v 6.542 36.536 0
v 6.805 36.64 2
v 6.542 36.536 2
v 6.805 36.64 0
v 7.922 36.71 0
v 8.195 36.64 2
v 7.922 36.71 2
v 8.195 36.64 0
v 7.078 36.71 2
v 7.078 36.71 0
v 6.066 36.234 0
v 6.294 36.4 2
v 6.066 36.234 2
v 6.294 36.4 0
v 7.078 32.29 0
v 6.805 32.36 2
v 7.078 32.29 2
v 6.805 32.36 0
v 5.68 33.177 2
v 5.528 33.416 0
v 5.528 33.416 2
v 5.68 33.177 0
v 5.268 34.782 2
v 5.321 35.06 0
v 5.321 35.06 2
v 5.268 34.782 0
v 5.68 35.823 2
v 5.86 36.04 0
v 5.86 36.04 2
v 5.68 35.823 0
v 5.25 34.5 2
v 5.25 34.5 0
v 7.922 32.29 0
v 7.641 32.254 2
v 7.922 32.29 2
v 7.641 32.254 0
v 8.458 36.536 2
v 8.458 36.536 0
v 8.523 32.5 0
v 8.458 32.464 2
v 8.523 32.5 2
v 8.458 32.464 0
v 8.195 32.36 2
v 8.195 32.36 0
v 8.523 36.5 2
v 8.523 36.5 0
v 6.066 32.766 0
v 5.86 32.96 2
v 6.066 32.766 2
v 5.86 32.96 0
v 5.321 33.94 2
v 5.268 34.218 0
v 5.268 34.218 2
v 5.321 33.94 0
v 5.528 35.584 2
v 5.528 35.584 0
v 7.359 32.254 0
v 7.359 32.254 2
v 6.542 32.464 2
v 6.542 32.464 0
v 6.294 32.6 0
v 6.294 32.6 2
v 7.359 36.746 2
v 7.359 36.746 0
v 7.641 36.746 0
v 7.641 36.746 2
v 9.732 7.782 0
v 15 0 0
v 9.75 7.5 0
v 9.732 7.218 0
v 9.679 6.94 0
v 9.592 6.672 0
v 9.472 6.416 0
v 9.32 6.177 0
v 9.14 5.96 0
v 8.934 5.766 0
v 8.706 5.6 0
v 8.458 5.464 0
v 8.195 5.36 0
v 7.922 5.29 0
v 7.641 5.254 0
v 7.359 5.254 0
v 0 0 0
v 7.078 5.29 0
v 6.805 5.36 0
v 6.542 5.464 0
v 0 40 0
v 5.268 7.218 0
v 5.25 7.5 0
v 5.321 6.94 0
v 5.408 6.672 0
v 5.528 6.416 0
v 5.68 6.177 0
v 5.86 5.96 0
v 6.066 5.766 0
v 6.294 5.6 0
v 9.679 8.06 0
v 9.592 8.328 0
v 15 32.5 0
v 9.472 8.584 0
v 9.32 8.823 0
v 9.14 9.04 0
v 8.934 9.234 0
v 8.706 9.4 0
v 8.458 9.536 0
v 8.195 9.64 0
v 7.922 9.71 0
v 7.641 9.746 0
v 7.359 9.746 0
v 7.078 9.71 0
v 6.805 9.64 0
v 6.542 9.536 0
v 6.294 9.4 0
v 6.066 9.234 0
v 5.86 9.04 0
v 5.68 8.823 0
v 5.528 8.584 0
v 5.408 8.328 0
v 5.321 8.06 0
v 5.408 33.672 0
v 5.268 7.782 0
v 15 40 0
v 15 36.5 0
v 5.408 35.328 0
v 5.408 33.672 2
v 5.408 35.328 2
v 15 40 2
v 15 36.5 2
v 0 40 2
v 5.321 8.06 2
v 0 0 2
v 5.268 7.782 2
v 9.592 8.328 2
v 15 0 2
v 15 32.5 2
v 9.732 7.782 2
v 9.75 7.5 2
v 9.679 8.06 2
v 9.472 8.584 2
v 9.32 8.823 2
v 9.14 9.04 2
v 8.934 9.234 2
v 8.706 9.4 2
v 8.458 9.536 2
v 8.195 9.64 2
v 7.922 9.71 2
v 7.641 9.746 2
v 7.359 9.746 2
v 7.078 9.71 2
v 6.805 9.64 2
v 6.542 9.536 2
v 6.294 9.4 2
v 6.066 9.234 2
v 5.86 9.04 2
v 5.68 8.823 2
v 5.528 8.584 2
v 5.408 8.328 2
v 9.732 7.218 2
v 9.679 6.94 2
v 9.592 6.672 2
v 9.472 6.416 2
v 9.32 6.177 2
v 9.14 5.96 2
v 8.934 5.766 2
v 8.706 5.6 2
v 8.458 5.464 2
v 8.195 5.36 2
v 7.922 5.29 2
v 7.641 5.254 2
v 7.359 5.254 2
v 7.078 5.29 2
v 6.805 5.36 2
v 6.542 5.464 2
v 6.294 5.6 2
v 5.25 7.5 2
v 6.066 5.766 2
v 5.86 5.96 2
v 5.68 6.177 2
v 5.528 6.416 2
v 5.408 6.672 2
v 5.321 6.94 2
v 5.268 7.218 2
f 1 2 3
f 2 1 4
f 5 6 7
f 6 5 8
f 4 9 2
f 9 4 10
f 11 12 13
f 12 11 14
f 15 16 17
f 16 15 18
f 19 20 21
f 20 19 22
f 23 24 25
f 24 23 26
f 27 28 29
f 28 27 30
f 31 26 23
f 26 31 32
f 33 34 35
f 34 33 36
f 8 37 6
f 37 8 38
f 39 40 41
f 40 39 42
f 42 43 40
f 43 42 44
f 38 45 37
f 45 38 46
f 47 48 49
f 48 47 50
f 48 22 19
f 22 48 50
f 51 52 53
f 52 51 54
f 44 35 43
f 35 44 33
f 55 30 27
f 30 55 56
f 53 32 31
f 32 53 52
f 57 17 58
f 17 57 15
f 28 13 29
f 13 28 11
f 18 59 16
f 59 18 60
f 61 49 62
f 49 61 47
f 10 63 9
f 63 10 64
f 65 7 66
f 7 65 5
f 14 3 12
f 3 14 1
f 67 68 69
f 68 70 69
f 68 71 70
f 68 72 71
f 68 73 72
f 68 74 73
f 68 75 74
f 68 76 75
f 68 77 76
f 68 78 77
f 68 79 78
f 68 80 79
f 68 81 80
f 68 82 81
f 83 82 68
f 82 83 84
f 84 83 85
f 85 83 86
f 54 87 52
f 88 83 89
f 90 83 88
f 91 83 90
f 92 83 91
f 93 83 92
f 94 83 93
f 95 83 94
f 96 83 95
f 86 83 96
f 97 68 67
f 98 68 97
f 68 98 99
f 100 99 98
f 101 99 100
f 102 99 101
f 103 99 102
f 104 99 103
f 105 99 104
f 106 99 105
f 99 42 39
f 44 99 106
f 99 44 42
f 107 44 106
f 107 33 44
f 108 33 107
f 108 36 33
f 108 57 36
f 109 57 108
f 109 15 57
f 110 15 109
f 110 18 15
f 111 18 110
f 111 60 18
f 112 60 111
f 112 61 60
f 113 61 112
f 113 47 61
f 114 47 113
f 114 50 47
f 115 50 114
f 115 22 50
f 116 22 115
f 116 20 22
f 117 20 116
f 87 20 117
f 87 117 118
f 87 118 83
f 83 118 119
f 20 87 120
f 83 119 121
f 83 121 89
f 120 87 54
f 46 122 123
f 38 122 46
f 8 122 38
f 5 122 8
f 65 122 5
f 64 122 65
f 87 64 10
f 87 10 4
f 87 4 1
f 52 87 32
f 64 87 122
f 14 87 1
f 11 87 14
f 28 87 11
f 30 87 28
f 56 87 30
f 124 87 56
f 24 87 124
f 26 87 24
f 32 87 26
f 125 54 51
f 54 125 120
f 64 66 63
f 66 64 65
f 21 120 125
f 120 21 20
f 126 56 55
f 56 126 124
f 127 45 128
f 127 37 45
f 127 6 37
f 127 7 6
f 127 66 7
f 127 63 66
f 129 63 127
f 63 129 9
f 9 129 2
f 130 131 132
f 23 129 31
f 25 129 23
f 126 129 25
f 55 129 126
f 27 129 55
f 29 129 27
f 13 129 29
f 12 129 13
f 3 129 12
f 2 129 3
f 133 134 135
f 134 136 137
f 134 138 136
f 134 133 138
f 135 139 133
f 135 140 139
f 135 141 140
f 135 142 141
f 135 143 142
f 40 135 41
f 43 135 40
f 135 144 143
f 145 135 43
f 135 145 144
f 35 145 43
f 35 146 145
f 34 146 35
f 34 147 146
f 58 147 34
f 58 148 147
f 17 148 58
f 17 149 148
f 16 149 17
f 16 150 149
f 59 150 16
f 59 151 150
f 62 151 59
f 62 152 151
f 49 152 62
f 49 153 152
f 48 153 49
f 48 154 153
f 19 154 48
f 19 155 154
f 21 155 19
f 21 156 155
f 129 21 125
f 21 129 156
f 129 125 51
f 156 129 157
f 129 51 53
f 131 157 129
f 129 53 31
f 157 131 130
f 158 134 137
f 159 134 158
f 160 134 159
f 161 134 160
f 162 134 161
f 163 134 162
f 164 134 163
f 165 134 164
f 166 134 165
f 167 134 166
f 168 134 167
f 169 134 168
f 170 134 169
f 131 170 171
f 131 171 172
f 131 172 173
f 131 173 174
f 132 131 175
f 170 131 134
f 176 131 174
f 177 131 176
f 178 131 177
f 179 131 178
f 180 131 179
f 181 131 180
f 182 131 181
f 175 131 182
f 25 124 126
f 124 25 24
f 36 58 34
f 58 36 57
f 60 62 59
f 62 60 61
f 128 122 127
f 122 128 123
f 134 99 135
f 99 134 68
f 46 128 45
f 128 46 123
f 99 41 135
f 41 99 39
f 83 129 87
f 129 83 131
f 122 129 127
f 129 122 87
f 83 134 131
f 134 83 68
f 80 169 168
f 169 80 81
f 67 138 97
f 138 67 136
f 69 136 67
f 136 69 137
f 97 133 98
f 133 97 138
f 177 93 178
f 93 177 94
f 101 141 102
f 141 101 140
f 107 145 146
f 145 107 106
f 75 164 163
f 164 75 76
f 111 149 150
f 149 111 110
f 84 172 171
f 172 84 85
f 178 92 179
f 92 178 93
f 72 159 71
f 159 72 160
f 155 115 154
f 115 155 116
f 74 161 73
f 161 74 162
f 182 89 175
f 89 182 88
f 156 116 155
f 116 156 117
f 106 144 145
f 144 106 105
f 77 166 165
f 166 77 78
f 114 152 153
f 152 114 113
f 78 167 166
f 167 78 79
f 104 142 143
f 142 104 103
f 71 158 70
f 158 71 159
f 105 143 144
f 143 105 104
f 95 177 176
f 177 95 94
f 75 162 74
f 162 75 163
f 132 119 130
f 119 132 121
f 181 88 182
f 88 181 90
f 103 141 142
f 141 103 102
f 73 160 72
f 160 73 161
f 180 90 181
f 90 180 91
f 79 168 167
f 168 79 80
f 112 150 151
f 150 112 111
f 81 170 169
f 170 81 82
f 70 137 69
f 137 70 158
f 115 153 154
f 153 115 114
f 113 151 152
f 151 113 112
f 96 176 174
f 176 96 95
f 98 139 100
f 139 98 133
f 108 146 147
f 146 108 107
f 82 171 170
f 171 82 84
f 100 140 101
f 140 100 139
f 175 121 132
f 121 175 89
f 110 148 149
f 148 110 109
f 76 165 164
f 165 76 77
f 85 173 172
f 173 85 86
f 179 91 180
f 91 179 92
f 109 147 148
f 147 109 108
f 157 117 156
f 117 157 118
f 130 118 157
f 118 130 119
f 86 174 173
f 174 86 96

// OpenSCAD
$fn=50;
diam_vis = 4;

plaque_epaisseur = 2;
plaque_largeur = 15;


difference_vis = 25;

vis_bas_y = plaque_largeur/2;


difference() {
    cube([plaque_largeur,40, plaque_epaisseur]);
    translate([plaque_largeur / 2, vis_bas_y])
        cylinder(h = plaque_epaisseur, d=diam_vis + 0.5);
    
    translate([plaque_largeur / 2, vis_bas_y + difference_vis]) {
        translate([0,diam_vis/2]) cylinder(h = plaque_epaisseur, d=diam_vis + 0.5);
        cube([plaque_largeur /2, diam_vis, plaque_epaisseur]);
    }
    
}
